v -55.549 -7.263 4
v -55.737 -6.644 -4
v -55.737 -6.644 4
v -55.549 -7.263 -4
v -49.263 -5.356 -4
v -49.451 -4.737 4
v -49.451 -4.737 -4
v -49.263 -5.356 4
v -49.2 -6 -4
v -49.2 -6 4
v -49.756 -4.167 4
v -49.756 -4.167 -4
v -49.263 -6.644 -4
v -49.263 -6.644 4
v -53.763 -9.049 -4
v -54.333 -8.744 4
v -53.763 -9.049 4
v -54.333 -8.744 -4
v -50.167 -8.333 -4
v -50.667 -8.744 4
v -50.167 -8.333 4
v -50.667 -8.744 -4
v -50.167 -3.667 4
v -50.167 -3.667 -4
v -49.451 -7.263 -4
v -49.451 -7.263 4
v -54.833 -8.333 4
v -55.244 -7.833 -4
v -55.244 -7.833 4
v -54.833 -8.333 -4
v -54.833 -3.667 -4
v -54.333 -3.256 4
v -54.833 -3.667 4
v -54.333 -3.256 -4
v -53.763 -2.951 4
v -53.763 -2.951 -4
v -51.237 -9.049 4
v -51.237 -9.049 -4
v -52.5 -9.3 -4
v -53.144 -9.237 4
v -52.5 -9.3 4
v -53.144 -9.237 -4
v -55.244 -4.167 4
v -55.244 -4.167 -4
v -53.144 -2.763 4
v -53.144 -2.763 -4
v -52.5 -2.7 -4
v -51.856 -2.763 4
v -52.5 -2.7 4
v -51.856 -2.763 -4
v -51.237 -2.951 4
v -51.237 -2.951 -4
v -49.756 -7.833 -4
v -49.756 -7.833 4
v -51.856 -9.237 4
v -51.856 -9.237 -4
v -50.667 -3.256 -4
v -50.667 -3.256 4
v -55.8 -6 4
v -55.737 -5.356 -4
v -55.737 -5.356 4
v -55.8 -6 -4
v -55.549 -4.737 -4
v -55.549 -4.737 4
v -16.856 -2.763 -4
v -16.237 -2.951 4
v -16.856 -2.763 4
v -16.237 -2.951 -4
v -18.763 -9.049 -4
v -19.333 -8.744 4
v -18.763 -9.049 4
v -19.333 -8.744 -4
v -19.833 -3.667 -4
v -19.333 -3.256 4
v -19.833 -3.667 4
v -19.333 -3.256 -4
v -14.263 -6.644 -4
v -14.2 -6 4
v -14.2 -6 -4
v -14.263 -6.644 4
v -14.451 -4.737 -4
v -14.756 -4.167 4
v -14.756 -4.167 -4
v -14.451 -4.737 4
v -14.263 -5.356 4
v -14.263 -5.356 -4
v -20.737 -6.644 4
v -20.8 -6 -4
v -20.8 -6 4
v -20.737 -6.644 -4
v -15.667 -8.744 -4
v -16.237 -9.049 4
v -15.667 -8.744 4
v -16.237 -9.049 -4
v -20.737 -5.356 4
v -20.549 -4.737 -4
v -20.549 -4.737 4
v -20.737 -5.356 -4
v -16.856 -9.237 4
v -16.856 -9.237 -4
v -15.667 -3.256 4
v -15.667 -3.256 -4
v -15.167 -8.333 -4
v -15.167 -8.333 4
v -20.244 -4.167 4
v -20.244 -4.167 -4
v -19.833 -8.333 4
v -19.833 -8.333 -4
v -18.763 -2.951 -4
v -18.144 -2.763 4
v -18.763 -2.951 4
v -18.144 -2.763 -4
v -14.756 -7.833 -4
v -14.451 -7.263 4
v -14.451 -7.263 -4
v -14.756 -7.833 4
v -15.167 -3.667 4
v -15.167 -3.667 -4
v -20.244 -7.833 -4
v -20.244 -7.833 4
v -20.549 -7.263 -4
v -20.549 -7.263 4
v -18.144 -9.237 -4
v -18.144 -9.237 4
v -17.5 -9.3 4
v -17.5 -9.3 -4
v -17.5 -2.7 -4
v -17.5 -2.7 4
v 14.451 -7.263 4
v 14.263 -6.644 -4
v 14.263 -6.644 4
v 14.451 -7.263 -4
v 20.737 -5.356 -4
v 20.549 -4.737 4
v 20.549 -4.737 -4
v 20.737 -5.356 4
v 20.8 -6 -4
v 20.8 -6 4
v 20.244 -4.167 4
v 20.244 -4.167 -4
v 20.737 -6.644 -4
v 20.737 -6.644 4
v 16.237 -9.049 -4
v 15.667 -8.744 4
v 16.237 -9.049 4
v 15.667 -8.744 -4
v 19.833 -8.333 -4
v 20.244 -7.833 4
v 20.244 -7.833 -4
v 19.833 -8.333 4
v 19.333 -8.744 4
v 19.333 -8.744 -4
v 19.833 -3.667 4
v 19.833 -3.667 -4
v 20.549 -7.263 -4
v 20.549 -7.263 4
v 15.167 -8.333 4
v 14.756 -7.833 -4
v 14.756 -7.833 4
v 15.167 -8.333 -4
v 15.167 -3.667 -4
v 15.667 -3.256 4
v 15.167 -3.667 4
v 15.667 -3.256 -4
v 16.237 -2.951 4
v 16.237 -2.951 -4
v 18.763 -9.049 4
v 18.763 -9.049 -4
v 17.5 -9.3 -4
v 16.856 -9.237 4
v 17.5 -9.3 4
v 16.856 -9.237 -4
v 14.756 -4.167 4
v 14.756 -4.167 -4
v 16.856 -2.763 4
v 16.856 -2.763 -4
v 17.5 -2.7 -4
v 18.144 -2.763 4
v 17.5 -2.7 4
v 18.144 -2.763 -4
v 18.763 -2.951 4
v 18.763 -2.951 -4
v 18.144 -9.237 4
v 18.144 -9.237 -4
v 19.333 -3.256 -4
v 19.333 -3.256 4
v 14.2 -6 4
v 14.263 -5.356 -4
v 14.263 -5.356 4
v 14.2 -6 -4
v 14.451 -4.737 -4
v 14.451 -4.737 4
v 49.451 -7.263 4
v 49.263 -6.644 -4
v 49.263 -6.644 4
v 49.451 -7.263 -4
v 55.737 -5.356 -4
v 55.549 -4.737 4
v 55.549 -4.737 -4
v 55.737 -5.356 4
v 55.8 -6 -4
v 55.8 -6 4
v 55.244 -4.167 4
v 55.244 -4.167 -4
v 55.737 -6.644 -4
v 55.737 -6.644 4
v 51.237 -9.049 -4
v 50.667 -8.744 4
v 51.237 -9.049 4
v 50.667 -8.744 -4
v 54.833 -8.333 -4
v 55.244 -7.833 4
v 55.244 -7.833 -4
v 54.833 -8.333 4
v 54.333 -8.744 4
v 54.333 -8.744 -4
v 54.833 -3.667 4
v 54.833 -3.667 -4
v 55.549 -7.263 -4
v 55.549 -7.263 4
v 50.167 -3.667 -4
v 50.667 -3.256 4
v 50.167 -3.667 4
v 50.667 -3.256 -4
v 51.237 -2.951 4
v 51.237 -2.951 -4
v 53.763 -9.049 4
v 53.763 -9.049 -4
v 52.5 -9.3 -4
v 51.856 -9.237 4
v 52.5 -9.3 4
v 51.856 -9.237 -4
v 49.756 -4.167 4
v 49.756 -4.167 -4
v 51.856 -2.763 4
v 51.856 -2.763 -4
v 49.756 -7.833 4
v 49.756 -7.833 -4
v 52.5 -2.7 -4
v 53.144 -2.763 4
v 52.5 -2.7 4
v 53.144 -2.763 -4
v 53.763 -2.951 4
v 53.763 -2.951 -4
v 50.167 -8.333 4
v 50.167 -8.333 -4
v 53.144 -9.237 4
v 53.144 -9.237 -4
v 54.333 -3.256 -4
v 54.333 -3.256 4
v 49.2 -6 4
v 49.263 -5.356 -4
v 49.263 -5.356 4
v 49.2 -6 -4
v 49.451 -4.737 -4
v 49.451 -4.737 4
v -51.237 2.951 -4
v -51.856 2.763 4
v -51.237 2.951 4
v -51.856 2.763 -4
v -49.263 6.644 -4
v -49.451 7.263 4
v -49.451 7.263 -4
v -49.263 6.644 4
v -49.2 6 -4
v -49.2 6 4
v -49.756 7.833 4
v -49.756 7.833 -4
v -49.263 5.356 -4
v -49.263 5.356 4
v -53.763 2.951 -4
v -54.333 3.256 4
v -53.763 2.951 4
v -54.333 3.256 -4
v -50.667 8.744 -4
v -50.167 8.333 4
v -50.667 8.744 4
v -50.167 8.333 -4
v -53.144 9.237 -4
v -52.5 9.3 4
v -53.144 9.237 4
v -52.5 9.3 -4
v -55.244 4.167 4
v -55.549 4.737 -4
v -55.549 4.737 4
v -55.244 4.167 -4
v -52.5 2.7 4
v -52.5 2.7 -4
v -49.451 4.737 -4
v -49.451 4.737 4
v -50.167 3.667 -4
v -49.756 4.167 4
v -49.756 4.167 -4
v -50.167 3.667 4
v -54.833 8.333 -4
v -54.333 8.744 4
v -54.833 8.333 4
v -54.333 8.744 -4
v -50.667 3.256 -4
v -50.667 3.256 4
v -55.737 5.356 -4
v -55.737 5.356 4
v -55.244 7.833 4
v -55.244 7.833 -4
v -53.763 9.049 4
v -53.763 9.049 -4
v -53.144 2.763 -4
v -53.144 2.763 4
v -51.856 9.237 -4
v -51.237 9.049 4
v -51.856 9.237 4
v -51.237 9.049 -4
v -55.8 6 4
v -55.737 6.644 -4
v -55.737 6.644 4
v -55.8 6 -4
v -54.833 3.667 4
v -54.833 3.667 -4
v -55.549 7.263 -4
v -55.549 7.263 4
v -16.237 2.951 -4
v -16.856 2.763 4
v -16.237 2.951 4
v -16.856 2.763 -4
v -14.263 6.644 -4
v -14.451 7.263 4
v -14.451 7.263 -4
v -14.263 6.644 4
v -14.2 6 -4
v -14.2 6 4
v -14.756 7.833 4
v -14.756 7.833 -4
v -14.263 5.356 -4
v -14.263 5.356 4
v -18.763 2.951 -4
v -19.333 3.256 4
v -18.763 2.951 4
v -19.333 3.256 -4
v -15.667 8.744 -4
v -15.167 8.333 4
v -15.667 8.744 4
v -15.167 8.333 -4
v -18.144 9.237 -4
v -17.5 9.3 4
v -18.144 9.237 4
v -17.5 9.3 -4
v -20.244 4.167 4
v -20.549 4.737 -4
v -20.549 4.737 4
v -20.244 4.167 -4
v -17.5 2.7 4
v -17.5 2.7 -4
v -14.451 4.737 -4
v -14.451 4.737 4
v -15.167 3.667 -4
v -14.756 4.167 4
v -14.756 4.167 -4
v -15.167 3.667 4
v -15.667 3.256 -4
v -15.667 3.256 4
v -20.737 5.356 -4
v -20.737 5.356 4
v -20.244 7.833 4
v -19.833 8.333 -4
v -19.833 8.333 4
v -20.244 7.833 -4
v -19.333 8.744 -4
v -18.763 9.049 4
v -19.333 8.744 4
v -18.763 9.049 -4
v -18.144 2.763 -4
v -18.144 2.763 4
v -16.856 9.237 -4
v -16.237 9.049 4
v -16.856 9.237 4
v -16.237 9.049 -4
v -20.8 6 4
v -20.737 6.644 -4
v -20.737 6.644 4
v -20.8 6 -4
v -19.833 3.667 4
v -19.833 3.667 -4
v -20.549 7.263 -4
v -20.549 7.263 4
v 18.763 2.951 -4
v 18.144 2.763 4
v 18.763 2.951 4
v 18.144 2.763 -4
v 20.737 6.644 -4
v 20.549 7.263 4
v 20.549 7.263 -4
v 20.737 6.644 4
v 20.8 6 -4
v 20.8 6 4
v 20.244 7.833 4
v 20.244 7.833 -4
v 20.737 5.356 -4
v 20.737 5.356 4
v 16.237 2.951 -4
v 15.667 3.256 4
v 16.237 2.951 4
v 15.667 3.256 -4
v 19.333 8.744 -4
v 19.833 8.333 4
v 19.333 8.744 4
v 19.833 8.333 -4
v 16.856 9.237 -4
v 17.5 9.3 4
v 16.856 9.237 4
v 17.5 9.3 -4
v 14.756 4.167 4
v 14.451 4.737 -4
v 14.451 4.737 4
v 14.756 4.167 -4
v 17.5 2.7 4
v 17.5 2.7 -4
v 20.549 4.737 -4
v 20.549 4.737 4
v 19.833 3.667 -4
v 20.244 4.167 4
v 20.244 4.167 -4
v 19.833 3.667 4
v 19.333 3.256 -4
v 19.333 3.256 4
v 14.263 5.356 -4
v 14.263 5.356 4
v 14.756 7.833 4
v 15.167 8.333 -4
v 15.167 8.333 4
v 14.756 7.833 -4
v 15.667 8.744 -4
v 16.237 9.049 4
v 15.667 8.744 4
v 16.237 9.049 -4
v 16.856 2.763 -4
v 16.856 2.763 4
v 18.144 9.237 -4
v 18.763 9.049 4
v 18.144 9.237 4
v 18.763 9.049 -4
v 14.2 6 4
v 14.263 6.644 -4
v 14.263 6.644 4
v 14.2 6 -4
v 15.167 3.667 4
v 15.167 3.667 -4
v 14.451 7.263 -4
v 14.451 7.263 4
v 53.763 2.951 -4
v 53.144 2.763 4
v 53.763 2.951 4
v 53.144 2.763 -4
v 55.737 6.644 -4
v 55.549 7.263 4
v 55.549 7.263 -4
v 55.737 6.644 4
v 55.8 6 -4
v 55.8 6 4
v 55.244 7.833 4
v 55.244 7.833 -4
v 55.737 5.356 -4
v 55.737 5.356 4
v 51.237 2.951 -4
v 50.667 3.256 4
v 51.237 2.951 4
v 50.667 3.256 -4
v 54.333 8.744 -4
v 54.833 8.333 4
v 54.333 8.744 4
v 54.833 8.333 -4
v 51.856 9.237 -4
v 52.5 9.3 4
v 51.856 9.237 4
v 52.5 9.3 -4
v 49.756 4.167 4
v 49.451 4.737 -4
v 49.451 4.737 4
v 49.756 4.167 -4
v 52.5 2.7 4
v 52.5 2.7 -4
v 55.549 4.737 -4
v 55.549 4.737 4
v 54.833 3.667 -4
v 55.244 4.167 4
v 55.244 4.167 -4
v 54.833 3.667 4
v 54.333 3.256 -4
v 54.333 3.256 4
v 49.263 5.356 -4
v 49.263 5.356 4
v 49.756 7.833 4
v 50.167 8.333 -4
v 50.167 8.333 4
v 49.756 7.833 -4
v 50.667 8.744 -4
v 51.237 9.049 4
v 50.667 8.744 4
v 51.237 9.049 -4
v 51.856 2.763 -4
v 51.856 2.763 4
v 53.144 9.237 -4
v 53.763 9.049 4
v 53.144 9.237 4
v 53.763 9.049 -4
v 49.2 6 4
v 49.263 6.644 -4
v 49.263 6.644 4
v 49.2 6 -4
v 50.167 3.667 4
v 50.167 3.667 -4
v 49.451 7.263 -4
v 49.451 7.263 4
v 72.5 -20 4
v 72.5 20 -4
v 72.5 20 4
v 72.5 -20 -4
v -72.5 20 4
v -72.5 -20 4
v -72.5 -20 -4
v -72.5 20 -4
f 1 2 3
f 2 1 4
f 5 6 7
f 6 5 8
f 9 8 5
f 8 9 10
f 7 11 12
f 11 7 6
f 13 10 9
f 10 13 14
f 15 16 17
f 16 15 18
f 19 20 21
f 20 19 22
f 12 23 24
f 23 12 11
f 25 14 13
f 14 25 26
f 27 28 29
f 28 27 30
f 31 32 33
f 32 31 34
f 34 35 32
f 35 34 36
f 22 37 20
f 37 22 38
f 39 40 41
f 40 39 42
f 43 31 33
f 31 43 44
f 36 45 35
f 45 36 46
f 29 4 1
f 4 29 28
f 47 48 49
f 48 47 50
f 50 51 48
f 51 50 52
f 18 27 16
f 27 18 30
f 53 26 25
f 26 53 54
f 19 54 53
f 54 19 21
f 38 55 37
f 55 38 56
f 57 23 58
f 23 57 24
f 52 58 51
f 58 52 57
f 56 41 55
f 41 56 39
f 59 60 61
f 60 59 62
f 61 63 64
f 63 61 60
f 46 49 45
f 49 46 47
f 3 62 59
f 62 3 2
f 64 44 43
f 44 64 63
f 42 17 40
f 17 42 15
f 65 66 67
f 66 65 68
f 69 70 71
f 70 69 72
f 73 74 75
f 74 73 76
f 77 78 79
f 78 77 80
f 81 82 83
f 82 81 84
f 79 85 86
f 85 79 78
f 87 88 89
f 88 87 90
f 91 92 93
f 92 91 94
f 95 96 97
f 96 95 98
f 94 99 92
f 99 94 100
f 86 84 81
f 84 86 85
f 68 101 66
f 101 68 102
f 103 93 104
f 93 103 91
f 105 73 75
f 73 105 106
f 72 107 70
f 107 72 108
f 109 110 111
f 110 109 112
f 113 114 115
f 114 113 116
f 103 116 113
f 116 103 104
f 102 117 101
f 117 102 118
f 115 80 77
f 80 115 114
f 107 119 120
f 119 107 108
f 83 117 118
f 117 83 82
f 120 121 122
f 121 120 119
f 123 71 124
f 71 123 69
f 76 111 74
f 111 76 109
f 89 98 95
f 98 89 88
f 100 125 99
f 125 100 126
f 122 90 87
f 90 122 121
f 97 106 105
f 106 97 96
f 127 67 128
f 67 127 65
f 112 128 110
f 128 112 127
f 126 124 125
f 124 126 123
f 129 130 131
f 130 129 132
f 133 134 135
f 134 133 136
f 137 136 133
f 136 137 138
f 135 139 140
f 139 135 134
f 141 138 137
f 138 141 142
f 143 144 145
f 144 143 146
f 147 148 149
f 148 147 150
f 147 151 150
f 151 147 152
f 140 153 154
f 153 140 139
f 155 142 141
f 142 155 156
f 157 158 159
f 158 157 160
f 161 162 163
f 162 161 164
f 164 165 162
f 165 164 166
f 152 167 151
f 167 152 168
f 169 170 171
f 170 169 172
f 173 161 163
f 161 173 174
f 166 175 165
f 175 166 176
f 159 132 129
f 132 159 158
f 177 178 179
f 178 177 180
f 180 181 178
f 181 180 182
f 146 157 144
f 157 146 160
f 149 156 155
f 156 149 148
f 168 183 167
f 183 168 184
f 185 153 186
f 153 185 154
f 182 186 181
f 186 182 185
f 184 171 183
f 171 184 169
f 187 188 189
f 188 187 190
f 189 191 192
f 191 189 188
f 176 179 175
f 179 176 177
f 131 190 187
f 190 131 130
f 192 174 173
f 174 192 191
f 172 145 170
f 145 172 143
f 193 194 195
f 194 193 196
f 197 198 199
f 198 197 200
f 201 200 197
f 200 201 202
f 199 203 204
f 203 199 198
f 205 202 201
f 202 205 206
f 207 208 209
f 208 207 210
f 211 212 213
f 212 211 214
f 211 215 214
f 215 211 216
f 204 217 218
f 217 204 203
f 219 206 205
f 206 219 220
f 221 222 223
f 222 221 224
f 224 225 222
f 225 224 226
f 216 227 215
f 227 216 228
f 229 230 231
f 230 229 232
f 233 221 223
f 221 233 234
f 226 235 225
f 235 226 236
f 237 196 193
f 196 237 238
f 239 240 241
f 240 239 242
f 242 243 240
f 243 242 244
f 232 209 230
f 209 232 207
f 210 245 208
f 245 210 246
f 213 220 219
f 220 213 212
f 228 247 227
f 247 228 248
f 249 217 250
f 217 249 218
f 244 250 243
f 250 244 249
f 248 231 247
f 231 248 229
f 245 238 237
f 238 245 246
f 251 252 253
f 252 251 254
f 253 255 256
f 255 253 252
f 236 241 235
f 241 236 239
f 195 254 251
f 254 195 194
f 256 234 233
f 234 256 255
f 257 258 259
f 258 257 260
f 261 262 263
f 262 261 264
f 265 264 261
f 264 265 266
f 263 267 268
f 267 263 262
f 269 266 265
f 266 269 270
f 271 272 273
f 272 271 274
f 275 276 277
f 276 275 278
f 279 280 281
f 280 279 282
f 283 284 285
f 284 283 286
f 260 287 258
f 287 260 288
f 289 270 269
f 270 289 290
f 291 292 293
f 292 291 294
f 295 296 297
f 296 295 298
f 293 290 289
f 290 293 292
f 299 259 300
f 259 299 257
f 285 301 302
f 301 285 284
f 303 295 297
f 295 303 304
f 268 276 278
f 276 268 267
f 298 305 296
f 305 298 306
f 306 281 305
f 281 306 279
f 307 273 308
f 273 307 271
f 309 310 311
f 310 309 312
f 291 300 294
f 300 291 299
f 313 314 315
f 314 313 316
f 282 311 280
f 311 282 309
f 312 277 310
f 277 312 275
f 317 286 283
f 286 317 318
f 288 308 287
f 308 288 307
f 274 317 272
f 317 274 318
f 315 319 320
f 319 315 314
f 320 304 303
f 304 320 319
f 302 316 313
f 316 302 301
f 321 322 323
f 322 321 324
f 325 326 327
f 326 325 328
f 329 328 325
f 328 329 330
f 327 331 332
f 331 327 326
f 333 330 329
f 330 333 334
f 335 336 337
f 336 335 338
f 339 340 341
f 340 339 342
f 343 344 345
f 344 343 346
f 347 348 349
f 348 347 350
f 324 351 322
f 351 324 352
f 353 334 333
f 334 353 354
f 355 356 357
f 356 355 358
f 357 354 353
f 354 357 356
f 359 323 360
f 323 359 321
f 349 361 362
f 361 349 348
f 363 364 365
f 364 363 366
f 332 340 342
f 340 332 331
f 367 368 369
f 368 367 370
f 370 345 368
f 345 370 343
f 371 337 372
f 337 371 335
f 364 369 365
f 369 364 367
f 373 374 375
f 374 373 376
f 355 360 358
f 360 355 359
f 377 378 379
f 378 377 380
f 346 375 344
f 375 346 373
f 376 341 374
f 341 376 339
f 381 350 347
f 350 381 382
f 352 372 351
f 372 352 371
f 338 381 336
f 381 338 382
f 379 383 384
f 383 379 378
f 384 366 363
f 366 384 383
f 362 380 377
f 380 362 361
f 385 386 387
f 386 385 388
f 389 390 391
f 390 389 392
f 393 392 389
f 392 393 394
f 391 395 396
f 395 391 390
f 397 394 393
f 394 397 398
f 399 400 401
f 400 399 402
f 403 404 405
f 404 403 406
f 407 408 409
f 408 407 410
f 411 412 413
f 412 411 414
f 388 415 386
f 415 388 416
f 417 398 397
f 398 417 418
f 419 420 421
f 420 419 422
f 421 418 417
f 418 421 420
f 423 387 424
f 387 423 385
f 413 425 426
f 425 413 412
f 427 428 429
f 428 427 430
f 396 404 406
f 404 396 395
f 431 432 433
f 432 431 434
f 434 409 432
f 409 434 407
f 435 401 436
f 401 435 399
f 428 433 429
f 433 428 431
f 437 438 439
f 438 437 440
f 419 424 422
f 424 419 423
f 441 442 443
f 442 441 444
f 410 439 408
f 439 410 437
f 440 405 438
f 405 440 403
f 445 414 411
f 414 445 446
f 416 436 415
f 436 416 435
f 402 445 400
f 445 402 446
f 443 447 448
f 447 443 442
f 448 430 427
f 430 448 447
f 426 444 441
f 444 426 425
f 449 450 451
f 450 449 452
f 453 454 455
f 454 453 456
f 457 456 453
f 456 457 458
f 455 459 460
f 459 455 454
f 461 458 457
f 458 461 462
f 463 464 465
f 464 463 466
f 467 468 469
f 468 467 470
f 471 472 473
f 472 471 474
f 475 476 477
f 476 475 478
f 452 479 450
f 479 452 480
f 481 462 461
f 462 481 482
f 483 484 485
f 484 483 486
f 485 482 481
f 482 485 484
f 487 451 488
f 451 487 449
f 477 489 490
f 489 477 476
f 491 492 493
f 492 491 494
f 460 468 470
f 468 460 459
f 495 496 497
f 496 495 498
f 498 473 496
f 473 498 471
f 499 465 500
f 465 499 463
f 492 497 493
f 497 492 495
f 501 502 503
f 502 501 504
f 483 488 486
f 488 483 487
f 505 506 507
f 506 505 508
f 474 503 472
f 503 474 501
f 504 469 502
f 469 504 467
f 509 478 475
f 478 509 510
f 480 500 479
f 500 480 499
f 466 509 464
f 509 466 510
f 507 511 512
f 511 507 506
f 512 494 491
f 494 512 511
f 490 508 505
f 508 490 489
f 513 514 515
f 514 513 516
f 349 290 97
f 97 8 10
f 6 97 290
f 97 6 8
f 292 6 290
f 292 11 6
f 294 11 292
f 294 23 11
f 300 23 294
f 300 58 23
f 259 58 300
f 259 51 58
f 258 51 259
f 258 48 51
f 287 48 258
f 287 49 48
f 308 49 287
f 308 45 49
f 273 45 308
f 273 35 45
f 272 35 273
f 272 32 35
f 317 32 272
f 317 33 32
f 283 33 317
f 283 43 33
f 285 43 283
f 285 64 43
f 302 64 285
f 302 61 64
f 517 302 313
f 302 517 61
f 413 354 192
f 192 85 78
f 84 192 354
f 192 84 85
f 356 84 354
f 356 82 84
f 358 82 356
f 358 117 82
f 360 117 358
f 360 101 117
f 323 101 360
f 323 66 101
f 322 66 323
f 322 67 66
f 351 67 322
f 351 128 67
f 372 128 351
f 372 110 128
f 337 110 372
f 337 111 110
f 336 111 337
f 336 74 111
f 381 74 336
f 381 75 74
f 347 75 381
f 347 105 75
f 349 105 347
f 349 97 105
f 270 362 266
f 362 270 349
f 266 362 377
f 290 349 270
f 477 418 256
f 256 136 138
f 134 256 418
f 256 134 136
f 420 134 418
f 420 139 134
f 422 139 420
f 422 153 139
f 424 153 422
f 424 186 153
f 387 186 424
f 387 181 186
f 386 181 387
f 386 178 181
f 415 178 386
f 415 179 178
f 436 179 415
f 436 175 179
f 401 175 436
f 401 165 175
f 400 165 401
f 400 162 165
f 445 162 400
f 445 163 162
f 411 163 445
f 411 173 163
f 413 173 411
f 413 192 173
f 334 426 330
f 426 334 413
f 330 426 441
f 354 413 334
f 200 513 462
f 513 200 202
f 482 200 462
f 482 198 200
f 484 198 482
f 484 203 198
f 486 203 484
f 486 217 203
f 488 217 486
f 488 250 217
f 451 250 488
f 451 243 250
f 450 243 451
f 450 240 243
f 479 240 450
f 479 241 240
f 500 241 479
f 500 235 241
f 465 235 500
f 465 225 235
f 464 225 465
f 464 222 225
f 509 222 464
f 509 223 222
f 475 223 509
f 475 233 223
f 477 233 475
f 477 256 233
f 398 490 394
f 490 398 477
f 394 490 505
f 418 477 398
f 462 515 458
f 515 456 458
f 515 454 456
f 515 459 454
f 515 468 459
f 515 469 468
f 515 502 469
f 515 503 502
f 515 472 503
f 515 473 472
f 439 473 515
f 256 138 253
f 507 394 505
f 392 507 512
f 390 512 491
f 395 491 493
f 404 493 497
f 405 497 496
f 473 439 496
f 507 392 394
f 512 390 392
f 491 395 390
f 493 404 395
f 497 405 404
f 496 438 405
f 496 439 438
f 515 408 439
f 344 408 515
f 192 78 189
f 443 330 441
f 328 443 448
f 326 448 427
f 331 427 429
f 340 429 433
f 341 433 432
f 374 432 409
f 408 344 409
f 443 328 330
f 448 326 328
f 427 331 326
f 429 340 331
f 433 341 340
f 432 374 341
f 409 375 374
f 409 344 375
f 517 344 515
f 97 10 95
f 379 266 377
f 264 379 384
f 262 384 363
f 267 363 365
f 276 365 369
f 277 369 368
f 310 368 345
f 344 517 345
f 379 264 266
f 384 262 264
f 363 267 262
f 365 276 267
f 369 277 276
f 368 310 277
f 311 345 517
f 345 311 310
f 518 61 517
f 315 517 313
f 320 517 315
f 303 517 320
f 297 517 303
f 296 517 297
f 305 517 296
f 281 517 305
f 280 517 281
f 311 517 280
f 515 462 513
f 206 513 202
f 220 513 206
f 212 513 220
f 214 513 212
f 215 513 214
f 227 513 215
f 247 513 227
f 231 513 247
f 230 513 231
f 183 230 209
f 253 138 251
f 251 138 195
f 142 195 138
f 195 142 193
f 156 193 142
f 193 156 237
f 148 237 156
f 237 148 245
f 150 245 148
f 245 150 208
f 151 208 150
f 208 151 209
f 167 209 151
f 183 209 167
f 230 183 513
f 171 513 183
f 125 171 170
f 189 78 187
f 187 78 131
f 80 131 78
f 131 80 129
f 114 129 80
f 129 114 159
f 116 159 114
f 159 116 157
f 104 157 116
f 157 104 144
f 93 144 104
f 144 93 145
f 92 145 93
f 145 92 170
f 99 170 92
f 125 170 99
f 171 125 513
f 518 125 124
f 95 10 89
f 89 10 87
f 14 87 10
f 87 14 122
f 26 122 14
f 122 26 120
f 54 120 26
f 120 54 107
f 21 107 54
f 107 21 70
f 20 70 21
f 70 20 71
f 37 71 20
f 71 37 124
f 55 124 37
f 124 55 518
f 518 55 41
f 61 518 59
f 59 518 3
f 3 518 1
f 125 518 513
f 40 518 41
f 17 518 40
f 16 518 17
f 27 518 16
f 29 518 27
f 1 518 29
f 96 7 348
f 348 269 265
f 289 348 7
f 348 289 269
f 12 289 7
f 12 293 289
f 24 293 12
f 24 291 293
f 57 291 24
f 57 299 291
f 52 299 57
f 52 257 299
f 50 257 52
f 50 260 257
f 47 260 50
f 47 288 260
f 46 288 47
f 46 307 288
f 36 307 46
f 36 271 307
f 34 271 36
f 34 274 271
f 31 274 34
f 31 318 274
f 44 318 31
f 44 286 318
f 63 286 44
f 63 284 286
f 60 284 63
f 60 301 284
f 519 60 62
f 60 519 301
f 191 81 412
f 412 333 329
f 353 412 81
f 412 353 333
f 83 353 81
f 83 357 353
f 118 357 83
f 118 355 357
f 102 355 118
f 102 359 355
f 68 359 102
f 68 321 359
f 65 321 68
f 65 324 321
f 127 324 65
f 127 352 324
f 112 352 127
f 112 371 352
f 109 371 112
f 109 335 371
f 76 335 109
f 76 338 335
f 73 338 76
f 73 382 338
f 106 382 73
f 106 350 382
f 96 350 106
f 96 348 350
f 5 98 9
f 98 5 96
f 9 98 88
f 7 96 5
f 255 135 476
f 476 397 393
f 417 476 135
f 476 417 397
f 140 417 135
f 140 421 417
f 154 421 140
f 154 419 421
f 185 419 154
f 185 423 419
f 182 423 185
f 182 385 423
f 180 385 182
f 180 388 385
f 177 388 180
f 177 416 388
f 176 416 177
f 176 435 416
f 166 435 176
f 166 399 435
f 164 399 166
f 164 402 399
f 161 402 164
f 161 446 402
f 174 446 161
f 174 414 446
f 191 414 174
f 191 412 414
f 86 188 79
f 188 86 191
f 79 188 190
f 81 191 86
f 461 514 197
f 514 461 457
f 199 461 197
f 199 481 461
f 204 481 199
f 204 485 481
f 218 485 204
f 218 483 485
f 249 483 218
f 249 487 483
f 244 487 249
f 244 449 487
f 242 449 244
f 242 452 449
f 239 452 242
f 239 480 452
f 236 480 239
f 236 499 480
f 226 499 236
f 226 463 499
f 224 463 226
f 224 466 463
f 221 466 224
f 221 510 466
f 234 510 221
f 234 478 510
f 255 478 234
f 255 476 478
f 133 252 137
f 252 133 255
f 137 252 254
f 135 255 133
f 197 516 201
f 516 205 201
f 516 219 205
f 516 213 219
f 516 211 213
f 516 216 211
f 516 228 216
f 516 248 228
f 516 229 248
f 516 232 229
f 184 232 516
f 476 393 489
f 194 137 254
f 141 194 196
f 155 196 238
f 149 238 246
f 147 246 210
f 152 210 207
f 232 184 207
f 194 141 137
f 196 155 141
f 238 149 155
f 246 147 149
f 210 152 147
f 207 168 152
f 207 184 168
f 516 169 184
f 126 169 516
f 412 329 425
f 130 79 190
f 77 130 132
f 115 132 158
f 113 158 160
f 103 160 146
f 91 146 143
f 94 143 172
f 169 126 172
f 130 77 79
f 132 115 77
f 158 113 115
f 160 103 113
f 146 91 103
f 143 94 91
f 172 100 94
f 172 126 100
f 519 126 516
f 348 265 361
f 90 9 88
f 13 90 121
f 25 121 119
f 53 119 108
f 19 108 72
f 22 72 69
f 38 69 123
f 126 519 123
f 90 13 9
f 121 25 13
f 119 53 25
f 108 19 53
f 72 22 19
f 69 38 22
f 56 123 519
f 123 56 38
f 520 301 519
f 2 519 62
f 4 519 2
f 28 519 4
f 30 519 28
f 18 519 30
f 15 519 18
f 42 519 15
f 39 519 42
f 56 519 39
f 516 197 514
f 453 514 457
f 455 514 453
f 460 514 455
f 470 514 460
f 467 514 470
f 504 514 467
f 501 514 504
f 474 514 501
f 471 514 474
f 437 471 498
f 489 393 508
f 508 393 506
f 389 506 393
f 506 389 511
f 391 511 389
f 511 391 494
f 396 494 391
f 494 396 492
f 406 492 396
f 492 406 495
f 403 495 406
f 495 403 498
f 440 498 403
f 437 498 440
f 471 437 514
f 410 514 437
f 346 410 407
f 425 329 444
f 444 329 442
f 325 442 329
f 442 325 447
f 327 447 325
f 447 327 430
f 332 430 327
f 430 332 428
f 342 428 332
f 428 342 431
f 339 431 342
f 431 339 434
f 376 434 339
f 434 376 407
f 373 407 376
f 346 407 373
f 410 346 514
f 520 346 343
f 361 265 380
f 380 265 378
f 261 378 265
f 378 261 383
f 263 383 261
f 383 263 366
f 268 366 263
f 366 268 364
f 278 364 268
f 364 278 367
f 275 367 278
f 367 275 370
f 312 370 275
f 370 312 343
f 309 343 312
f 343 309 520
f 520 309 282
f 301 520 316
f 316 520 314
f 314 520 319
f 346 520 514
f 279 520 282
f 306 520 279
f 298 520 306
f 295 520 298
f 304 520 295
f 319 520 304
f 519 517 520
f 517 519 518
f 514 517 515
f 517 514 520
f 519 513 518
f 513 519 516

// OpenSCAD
$fn = 32;

// ----------------------------------------------------------------------
// Hole bar, 4 x Ø6.6
// tworows layout, 20 mm edge offset
// ----------------------------------------------------------------------

// --- parameters (mm) ---
bar_w = 40;       // bar width (Y)
bar_t = 8;        // bar thickness (Z)
holes = 4;        // holes per row
hole_d = 6.6;     // hole diameter
edge = 20;        // offset from the bar end to the first hole
pitch = 35;       // pitch between neighbouring holes
row_offset = 12;  // distance between the two rows

// --- derived feature positions (mm) ---
span = (holes - 1) * pitch;   // = 105   distance between the end holes
bar_l = span + 2 * edge;      // = 145   overall bar length
start_x = -bar_l / 2 + edge;  // = -52.5   X of the first hole
feature_centers = [
  [start_x + 0 * pitch, -row_offset / 2],
  [start_x + 1 * pitch, -row_offset / 2],
  [start_x + 2 * pitch, -row_offset / 2],
  [start_x + 3 * pitch, -row_offset / 2]
];   // hole centres of the first row
row2_centers = [
  [start_x + 0 * pitch, row_offset / 2],
  [start_x + 1 * pitch, row_offset / 2],
  [start_x + 2 * pitch, row_offset / 2],
  [start_x + 3 * pitch, row_offset / 2]
];   // hole centres of the second row

// bar with two rows of holes, both read from their own centre arrays
difference() {
  translate([-bar_l / 2, -bar_w / 2, -bar_t / 2]) cube([bar_l, bar_w, bar_t]);
  for (centre = feature_centers)
    translate([centre[0], centre[1], 0])
      cylinder(d = hole_d, h = bar_t + 2, center = true);
  for (centre = row2_centers)
    translate([centre[0], centre[1], 0])
      cylinder(d = hole_d, h = bar_t + 2, center = true);
}
